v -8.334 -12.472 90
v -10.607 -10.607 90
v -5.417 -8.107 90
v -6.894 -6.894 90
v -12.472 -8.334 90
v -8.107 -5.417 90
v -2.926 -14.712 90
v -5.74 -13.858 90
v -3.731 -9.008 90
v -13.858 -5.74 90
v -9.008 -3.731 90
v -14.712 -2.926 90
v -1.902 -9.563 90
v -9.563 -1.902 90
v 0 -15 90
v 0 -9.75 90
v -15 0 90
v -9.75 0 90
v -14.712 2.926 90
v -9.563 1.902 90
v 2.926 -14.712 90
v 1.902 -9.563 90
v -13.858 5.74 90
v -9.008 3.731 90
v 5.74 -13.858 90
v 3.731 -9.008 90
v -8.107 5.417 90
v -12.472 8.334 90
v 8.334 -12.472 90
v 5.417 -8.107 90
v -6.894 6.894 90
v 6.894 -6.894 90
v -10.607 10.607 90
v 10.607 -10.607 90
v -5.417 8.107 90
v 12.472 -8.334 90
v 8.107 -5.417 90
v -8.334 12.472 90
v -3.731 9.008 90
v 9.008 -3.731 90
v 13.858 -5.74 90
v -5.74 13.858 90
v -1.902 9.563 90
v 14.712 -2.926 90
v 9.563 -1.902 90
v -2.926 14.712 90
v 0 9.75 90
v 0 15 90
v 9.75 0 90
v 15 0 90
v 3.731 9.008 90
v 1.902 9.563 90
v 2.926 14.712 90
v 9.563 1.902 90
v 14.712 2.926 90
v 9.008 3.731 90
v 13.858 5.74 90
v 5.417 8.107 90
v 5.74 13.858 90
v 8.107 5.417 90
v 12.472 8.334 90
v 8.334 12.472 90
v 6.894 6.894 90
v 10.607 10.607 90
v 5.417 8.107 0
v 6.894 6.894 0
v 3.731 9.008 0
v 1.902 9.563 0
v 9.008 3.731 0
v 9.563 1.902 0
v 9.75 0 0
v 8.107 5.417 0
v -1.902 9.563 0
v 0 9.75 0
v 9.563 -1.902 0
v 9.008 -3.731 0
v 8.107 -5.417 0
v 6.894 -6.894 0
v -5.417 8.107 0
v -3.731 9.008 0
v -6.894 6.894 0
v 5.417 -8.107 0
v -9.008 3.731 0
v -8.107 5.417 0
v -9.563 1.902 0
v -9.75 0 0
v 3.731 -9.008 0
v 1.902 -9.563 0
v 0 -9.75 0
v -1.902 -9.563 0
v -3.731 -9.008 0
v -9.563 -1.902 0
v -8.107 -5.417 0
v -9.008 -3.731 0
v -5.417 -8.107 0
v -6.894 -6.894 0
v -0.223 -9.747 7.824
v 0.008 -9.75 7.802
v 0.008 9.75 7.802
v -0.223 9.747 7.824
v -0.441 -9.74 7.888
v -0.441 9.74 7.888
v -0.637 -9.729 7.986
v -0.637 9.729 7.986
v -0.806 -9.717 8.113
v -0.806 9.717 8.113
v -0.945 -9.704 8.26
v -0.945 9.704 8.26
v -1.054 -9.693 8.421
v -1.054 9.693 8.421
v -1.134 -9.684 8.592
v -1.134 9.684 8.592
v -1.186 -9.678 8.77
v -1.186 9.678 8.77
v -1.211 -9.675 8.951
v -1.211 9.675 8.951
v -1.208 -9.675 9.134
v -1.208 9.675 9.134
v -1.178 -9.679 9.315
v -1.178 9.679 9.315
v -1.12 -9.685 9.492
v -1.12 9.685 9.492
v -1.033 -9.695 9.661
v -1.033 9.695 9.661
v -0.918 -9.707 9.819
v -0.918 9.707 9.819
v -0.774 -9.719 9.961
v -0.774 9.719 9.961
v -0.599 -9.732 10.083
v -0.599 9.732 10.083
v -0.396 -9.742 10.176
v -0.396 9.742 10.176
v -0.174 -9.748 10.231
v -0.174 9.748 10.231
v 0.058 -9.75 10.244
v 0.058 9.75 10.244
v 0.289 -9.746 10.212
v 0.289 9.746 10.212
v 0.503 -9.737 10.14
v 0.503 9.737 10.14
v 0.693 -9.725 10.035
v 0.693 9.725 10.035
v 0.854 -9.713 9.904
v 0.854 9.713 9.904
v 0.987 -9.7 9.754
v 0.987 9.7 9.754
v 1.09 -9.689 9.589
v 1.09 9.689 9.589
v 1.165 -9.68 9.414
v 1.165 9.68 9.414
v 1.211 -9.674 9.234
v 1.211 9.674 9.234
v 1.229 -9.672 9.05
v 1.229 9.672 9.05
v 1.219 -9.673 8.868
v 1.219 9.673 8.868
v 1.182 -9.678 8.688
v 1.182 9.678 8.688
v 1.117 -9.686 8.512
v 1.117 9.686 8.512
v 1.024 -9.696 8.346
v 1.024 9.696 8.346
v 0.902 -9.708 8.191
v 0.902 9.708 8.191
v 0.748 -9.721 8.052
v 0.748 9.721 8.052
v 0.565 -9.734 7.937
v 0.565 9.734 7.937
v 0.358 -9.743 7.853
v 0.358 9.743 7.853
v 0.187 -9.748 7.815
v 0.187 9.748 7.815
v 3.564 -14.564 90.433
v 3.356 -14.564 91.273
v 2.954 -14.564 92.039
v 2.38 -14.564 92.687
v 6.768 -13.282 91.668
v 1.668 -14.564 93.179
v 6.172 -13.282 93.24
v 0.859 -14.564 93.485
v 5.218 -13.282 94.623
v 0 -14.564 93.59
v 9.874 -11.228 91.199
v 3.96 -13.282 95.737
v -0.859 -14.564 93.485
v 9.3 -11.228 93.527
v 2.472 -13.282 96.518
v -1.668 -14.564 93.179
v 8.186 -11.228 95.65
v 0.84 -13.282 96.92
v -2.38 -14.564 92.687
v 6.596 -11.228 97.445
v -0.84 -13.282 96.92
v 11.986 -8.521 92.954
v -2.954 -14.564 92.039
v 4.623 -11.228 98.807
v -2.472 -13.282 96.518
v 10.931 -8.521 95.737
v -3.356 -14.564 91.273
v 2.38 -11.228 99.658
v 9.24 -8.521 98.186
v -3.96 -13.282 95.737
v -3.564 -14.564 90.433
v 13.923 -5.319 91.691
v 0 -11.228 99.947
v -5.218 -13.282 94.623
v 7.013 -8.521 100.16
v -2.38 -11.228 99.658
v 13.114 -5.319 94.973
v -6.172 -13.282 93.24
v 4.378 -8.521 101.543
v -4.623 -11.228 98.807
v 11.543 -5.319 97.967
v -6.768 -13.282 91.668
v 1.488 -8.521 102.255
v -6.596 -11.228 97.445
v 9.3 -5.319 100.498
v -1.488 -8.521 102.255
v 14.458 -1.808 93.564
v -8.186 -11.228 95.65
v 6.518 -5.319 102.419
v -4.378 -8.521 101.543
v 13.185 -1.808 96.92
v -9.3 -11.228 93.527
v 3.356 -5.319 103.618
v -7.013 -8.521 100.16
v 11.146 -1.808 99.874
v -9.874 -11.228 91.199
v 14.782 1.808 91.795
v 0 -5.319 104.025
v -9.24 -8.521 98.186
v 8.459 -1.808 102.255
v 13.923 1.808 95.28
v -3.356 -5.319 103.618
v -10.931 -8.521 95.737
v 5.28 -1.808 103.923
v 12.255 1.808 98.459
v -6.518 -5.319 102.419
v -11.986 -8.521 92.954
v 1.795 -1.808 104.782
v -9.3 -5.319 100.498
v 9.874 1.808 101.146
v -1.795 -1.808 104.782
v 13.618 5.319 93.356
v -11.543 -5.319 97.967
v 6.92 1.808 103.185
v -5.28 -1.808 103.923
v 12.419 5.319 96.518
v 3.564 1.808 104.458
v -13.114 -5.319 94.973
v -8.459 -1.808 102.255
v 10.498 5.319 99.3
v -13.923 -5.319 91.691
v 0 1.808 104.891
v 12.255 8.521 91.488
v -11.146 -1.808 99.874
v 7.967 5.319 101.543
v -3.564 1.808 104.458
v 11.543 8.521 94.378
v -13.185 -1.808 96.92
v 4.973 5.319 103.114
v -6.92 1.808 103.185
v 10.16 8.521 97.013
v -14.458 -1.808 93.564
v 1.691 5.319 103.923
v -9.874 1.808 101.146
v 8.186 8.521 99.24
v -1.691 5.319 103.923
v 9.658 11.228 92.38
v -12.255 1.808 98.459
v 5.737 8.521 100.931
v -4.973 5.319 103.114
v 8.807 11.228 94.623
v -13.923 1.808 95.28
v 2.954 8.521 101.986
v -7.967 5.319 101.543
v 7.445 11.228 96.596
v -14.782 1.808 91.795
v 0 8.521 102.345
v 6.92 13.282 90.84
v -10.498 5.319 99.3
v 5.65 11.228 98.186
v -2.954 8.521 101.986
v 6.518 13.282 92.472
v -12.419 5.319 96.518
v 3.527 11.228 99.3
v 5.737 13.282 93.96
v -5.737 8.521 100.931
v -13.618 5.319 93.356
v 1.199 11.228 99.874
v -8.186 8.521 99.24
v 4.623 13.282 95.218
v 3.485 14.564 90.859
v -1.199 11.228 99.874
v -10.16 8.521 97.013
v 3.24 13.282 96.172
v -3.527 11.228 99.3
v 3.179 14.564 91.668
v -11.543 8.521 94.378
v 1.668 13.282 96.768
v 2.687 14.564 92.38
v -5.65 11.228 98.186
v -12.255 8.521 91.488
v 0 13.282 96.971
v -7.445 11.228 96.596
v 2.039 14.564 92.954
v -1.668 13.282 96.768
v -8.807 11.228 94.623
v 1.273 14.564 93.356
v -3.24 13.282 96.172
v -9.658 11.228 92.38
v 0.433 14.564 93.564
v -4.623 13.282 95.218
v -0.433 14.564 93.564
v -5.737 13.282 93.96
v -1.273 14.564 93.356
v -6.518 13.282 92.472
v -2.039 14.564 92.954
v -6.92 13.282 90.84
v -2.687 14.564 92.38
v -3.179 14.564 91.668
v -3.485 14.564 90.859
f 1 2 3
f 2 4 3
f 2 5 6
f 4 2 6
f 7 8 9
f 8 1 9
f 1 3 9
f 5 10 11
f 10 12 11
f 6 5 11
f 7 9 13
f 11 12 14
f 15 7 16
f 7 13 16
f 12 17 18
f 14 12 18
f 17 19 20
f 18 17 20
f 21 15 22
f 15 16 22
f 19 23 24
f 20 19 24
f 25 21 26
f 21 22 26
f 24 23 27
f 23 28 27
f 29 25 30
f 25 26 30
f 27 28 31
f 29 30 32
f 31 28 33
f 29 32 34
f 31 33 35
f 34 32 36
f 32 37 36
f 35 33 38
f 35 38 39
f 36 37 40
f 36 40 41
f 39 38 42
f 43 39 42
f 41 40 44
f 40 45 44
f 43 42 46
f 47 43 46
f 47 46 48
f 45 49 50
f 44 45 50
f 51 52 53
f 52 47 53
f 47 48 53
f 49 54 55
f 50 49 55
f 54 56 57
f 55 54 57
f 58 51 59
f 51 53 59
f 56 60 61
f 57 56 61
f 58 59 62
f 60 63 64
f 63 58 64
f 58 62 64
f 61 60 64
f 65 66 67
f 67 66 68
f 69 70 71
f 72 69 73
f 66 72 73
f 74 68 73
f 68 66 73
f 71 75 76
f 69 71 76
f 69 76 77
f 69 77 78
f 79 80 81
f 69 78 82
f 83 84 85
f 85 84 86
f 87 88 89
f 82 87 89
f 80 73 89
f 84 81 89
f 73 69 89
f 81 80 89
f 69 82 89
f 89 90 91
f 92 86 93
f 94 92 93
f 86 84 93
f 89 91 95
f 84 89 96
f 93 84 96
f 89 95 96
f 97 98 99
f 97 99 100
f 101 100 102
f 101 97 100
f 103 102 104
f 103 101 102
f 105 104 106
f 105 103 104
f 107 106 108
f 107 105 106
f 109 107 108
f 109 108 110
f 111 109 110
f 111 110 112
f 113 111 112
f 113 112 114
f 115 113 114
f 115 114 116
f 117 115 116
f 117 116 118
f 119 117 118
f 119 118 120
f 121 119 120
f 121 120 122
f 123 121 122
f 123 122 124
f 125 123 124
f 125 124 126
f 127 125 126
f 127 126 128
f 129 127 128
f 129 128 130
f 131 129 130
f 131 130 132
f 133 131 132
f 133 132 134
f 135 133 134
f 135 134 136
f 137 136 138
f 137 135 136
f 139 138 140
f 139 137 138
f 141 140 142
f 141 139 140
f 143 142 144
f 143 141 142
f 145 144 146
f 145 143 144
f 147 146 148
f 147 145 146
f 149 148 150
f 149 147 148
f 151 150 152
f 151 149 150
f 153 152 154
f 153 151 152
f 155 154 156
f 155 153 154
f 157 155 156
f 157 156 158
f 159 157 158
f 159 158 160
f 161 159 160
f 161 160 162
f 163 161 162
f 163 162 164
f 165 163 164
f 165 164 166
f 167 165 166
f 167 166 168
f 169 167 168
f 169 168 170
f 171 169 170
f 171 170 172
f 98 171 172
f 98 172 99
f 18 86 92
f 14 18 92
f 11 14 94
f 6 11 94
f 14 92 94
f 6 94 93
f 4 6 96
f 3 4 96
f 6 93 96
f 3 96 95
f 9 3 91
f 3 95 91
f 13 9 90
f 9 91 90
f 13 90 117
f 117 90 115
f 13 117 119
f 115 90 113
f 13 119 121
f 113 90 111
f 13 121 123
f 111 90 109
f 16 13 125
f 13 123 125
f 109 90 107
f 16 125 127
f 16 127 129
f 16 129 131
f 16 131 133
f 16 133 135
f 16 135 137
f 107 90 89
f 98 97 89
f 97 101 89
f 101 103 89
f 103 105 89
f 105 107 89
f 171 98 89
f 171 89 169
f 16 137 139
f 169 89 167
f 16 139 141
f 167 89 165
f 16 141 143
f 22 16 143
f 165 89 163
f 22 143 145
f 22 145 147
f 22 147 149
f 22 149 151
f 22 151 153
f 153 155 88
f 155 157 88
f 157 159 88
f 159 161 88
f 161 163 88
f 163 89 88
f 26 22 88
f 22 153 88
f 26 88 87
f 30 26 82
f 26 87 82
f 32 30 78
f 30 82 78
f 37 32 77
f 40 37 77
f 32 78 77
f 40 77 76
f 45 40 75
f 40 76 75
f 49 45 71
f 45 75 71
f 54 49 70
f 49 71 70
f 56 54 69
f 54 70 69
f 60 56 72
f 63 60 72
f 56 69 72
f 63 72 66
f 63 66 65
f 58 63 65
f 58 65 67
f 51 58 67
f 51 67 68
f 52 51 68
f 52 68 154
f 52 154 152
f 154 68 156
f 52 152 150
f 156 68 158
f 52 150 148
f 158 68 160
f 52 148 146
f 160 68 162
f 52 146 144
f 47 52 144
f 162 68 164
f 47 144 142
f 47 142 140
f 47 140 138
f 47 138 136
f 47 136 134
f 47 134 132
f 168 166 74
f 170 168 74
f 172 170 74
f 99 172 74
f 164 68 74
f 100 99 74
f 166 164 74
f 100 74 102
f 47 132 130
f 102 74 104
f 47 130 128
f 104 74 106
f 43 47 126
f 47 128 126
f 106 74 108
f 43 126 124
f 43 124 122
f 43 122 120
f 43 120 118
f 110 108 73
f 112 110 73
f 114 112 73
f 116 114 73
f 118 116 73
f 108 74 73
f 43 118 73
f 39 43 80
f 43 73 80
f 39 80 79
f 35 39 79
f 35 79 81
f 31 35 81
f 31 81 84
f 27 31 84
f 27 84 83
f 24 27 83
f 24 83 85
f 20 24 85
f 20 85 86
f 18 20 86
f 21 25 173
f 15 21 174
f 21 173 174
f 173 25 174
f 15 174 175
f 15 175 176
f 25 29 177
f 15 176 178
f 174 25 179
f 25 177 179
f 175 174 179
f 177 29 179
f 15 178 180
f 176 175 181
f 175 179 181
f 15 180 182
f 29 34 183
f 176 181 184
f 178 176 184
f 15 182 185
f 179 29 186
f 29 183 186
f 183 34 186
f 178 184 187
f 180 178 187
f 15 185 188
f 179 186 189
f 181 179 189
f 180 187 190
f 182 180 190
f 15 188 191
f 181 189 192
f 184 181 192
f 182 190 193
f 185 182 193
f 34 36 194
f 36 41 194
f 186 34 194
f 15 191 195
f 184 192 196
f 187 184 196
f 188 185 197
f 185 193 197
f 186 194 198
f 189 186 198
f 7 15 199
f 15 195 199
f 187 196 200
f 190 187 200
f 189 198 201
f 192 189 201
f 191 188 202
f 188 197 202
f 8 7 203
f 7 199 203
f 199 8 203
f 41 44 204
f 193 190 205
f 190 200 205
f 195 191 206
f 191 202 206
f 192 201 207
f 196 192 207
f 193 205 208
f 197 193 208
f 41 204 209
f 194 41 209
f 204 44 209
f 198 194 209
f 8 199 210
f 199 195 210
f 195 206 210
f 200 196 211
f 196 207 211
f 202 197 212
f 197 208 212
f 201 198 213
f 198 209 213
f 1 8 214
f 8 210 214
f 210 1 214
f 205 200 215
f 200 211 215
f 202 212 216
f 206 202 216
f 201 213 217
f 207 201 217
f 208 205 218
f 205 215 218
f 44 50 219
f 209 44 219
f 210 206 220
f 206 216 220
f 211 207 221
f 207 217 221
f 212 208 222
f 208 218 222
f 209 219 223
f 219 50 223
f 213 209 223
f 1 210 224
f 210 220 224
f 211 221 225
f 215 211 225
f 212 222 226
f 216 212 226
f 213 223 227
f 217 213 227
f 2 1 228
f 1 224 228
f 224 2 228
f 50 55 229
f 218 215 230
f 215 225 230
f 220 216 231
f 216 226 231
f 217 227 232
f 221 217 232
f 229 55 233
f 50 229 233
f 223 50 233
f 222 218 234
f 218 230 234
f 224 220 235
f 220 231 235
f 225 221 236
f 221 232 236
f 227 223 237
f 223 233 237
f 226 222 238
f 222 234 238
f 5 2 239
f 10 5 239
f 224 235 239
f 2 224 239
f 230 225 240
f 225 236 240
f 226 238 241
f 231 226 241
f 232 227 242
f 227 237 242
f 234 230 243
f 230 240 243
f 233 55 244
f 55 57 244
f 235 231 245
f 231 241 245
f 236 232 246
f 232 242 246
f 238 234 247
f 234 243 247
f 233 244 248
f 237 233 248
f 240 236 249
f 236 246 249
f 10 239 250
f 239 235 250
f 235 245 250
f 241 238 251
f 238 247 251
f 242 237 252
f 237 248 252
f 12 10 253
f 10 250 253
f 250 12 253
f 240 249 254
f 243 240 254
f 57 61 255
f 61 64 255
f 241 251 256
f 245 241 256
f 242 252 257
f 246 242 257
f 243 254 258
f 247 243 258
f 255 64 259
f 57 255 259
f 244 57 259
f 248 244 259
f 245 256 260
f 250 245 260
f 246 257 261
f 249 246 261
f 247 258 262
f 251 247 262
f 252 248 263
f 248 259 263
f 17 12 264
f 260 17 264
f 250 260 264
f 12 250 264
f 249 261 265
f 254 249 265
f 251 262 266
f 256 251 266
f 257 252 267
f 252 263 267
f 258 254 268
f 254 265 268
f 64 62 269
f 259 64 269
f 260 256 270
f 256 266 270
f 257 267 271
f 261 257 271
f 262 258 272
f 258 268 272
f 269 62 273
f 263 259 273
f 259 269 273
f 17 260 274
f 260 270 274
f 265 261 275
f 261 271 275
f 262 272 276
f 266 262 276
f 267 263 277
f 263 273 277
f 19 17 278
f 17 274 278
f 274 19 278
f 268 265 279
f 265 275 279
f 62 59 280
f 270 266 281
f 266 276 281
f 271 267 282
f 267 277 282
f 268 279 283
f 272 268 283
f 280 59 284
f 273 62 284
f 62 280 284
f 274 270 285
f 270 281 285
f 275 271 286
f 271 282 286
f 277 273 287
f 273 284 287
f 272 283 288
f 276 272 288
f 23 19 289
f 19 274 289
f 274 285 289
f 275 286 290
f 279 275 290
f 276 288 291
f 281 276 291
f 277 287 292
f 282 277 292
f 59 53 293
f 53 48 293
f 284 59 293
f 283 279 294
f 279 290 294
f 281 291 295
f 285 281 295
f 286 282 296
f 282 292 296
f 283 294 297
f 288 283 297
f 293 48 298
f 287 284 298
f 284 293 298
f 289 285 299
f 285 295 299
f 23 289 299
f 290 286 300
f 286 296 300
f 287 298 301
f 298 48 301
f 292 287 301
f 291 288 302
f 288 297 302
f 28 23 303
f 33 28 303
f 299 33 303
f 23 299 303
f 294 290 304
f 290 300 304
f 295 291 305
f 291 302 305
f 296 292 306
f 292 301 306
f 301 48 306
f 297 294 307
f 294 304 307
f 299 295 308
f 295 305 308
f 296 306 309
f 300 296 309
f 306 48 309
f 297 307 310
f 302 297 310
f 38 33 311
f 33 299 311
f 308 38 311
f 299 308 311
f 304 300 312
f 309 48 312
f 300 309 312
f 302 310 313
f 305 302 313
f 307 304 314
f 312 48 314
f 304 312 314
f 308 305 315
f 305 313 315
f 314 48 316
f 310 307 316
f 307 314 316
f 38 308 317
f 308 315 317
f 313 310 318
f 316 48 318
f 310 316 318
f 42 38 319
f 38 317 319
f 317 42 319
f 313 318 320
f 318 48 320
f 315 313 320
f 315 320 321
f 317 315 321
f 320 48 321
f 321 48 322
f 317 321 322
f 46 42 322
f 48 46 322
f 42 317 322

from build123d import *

# Parameters (mm, degrees)
SKETCH1_R               = 9.75
BOSS_EXTRUDE1_DEPTH     = 90
REVOLVE1_ANGLE          = 180
CUT_EXTRUDE1_DEPTH      = 22
CUT_EXTRUDE1_DEPTH_BACK = 22
SKETCH3_R               = 1.221236648


with BuildPart() as part:
    # Sketch1 → Boss-Extrude1 (new body)
    with BuildSketch(Plane.XY):
        Circle(SKETCH1_R)
    extrude(amount=BOSS_EXTRUDE1_DEPTH)

    # Sketch2 → Revolve1 (revolve)
    with BuildSketch(Plane.XY.offset(90)):
        with BuildLine():
            Line((0, 15), (0, -15))
            ThreePointArc((0, -15), (15, 0), (0, 15))
        make_face()
    revolve(axis=Axis((0, 15, 90), (0, -1, 0)), revolution_arc=REVOLVE1_ANGLE)

    # Sketch3 → Cut-Extrude1 (cut, two sides: drawn at the far end of the back side and taken through both)
    with BuildSketch(Plane(origin=(0, 0, 0), x_dir=(1, 0, 0), z_dir=(0, 1, 0)).offset(-CUT_EXTRUDE1_DEPTH_BACK)):
        with Locations((0.008150648, -9.023432345)):
            Circle(SKETCH3_R)
    extrude(amount=CUT_EXTRUDE1_DEPTH + CUT_EXTRUDE1_DEPTH_BACK, mode=Mode.SUBTRACT)


solid = part.part
